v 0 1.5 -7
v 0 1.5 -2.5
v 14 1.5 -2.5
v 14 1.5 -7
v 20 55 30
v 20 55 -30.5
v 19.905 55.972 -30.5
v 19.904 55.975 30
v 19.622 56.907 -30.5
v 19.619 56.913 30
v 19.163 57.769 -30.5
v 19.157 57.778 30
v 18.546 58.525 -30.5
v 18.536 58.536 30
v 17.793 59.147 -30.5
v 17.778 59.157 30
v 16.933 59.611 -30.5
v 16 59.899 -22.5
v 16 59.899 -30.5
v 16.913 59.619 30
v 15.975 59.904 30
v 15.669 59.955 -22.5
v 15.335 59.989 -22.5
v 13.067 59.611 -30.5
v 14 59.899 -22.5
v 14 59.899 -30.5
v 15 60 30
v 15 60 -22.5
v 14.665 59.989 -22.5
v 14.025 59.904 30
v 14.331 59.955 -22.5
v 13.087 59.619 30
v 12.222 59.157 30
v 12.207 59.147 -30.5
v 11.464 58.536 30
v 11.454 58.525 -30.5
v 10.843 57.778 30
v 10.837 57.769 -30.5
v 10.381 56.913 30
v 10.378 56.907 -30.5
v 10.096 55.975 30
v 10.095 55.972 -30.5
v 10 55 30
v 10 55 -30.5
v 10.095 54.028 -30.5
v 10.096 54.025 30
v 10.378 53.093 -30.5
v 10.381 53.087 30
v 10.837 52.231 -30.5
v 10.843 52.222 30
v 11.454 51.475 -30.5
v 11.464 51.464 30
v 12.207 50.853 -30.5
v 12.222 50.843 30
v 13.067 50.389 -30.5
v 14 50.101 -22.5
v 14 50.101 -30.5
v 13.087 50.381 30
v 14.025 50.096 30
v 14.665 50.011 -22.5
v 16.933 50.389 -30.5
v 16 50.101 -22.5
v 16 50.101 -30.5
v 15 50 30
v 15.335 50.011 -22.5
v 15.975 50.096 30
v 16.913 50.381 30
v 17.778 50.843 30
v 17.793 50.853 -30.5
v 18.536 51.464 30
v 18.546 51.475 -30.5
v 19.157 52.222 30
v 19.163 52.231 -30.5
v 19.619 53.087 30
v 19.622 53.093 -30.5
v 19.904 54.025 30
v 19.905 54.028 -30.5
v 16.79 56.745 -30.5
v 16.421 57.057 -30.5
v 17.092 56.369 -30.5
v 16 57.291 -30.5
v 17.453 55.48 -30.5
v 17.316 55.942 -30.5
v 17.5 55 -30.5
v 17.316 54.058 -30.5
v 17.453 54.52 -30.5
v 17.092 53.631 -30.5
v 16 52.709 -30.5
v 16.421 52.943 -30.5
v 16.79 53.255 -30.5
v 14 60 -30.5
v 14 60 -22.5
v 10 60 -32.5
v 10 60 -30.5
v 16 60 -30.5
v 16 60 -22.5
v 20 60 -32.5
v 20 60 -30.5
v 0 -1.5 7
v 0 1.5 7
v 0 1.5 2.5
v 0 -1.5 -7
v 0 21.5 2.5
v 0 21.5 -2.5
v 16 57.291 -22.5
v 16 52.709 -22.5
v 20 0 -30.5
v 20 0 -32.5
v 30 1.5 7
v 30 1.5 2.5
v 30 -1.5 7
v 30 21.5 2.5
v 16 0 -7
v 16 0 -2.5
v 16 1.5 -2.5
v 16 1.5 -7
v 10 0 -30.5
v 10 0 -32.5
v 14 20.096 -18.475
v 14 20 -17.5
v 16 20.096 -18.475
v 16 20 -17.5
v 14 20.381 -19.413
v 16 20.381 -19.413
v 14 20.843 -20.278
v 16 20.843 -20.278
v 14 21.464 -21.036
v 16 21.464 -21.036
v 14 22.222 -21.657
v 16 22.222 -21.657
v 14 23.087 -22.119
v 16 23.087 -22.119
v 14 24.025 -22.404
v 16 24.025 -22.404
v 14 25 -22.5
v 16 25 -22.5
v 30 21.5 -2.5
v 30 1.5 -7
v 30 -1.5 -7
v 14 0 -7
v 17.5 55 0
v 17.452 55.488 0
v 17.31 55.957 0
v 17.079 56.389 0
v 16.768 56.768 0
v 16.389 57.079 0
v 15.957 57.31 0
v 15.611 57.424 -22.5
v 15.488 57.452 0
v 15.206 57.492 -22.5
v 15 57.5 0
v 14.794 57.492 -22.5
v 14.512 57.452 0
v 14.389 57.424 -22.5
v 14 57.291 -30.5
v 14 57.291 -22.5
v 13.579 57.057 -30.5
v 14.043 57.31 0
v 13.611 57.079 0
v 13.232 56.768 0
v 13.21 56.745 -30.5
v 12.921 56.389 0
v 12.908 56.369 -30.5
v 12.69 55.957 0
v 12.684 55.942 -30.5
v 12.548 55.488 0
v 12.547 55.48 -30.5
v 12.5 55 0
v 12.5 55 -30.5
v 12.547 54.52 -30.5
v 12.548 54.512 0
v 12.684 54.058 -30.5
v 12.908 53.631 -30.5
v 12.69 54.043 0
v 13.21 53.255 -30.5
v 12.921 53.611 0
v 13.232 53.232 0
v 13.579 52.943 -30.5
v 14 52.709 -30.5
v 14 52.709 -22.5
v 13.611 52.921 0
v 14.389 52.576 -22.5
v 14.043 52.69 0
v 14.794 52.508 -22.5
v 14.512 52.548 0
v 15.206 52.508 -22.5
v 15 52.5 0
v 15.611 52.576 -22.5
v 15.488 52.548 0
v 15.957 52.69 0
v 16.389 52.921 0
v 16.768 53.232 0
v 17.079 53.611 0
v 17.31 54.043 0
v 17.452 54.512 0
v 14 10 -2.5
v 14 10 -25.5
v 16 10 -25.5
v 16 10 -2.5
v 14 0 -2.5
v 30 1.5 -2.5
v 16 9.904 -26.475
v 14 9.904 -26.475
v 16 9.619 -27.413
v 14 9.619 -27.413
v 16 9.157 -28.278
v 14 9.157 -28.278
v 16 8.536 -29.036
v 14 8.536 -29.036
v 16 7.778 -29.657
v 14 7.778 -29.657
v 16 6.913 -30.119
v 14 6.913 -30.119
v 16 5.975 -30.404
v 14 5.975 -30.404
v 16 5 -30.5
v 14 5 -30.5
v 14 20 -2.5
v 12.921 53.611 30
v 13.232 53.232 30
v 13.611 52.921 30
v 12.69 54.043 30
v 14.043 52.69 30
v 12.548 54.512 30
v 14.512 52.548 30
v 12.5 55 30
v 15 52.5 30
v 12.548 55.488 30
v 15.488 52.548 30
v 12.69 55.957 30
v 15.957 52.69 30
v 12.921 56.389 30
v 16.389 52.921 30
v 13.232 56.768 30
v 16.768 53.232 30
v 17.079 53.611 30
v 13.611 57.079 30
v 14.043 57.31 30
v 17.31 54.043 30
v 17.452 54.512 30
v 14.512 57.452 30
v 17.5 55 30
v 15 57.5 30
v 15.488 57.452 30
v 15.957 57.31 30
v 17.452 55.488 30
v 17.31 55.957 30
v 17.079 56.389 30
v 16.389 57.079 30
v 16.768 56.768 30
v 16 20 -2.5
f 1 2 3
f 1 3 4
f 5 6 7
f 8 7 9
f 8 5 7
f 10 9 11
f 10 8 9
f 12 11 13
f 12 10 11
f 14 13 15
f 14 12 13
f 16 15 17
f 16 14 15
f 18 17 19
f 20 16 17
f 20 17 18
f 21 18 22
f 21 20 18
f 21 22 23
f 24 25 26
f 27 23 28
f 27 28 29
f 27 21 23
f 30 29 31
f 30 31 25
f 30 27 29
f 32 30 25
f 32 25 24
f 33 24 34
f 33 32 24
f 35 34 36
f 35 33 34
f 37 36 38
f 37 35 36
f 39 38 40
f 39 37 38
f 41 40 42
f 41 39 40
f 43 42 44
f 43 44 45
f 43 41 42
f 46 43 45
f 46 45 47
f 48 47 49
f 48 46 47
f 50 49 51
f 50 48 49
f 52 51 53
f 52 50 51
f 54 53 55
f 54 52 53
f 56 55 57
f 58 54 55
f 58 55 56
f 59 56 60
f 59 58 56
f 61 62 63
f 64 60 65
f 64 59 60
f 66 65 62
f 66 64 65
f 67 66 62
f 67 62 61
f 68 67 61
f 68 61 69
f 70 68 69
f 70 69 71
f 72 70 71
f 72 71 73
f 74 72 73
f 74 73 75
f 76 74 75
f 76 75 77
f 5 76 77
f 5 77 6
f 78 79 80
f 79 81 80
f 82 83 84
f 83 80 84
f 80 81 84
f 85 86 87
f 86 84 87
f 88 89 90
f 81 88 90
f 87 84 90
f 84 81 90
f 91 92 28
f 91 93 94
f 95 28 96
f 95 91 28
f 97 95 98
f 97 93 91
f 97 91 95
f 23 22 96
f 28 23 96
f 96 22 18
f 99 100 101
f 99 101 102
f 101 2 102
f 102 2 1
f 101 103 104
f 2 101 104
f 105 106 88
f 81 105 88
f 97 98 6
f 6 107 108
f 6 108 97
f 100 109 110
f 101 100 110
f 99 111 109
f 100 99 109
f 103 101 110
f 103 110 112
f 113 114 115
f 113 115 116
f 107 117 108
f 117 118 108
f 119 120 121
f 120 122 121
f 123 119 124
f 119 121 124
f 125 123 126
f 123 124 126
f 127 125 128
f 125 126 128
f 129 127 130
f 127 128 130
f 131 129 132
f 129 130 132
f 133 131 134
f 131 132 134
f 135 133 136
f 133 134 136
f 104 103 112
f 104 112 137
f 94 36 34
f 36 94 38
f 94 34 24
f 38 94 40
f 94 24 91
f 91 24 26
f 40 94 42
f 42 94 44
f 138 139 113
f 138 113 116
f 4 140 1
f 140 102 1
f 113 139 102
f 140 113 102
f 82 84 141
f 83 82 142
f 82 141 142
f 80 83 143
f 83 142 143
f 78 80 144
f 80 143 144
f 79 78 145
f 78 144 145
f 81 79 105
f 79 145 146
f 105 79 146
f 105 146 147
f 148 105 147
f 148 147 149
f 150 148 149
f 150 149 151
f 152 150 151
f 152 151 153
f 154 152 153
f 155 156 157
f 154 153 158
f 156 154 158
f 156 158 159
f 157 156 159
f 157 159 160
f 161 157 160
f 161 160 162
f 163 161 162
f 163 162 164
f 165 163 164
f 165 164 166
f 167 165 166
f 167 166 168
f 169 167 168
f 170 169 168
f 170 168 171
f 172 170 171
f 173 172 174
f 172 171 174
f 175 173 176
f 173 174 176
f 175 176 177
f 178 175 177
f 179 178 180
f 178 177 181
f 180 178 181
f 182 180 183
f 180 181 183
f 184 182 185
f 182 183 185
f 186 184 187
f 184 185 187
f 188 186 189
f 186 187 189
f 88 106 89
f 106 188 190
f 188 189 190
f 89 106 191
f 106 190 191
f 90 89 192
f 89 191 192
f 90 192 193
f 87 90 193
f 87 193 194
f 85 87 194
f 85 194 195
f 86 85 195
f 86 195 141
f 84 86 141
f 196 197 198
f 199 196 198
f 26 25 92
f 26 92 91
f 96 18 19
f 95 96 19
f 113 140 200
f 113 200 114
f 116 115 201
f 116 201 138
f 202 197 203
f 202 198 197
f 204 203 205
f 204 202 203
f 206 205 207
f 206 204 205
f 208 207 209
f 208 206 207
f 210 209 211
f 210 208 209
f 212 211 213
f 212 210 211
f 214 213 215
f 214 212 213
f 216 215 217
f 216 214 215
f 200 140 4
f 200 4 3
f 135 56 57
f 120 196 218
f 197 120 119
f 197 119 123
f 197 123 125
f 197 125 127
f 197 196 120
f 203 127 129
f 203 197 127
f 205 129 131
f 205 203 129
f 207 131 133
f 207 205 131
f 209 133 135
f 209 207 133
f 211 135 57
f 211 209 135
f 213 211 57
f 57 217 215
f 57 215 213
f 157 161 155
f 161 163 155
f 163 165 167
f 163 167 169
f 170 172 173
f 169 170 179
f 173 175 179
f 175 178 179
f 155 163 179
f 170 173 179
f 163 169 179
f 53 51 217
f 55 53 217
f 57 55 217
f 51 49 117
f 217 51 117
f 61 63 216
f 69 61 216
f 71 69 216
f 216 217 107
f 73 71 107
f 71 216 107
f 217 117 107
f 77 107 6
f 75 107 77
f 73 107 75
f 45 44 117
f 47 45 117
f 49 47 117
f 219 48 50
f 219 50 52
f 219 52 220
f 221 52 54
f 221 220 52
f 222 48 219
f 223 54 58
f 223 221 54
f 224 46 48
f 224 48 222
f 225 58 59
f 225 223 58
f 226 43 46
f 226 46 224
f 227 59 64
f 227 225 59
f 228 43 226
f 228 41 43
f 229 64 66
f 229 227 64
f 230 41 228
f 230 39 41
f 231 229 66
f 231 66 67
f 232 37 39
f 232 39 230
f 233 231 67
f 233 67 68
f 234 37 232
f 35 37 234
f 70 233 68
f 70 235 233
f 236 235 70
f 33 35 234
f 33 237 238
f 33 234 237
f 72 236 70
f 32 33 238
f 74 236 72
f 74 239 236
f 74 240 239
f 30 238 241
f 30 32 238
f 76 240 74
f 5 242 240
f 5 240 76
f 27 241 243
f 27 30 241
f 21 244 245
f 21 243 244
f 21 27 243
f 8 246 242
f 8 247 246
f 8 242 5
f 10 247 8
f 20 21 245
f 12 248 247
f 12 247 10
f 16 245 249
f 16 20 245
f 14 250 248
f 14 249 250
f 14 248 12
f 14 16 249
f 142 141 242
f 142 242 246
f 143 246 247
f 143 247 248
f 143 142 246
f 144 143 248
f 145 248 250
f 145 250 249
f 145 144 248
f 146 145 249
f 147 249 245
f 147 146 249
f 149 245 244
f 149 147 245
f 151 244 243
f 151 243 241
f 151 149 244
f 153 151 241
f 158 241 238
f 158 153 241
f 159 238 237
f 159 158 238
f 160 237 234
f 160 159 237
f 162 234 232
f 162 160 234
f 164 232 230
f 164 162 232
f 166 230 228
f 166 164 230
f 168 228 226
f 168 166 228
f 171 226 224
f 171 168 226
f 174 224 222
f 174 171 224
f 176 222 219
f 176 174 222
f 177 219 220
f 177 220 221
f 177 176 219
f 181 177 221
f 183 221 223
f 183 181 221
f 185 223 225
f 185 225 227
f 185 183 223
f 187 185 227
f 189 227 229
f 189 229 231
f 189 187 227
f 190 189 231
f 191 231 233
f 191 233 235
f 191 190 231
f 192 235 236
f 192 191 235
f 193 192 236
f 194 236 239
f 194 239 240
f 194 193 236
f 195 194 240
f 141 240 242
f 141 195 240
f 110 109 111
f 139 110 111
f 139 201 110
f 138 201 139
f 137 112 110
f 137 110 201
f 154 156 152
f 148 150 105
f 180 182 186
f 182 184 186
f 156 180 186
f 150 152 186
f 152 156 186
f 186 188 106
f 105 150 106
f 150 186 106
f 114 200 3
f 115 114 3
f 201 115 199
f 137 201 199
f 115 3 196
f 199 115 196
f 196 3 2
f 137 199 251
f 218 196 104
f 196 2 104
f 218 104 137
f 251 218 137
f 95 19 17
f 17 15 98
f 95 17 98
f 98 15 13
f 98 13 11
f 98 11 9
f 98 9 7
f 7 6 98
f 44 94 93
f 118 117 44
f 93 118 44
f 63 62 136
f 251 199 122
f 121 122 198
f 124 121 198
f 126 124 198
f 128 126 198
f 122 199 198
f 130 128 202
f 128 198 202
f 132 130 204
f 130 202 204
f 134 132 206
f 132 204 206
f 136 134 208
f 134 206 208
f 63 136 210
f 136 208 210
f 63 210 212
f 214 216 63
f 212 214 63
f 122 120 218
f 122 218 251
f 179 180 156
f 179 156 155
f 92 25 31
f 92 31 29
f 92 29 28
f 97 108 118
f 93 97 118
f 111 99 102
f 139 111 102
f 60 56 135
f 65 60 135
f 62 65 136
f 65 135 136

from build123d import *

# Parameters (mm, degrees)
SKETCH1_W                       = 5
SKETCH1_H                       = 20
SKETCH1_W_2                     = 14
SKETCH1_H_2                     = 3
BOSS_EXTRUDE1_DEPTH             = 30
SKETCH4_W                       = 4
SKETCH4_H                       = 2
SKETCH4_W_2                     = 2
SKETCH4_H_2                     = 8
BOSS_EXTRUDE2_DEPTH             = 60
SKETCH4_4_W                     = 2
SKETCH4_4_H                     = 20
BOSS_EXTRUDE3_DEPTH             = 20
SKETCH4_5_W                     = 2
SKETCH4_5_H                     = 8
SKETCH4_5_H_2                   = 20
CUT_EXTRUDE1_DEPTH              = 10
SKETCH2_R                       = 5
SKETCH2_R_2                     = 2.5
BOSS_EXTRUDE4_DEPTH             = 30
BOSS_EXTRUDE4_DIRECTION_2_REACH = 76.54
FILLET1_R                       = 5


with BuildPart() as part:
    # Sketch1 → Boss-Extrude1 (new body)
    with BuildSketch(Plane(origin=(0, 0, 0), x_dir=(0, 0, -1), z_dir=(1, 0, 0))):
        with Locations((0, 11.5)):
            Rectangle(SKETCH1_W, SKETCH1_H)
        Rectangle(SKETCH1_W_2, SKETCH1_H_2)
    extrude(amount=BOSS_EXTRUDE1_DEPTH)



with BuildPart() as body_2:
    # Sketch4 → Boss-Extrude2 (new body)
    with BuildSketch(Plane(origin=(0, 0, 0), x_dir=(1, 0, 0), z_dir=(0, 1, 0))):
        with Locations((18, 31.5)):
            Rectangle(SKETCH4_W, SKETCH4_H)
        with Locations((15, 31.5)):
            Rectangle(SKETCH4_W_2, SKETCH4_H)
        with Locations((12, 31.5)):
            Rectangle(SKETCH4_W, SKETCH4_H)
        with Locations((15, 26.5)):
            Rectangle(SKETCH4_W_2, SKETCH4_H_2)
    extrude(amount=BOSS_EXTRUDE2_DEPTH)


with BuildPart() as part_1:
    add(part.part)

    add(body_2.part)  # Boss-Extrude3 merges body 2
    # Sketch4<4> → Boss-Extrude3 (add)
    with BuildSketch(Plane(origin=(0, 0, 0), x_dir=(1, 0, 0), z_dir=(0, 1, 0))):
        with Locations((15, 12.5)):
            Rectangle(SKETCH4_4_W, SKETCH4_4_H)
    extrude(amount=BOSS_EXTRUDE3_DEPTH)

    # Sketch4<5> → Cut-Extrude1 (cut)
    with BuildSketch(Plane(origin=(0, 0, 0), x_dir=(1, 0, 0), z_dir=(0, 1, 0))):
        with Locations((15, 26.5)):
            Rectangle(SKETCH4_5_W, SKETCH4_5_H)
        with Locations((15, 12.5)):
            Rectangle(SKETCH4_5_W, SKETCH4_5_H_2)
    extrude(amount=CUT_EXTRUDE1_DEPTH, mode=Mode.SUBTRACT)

    # Sketch2 → Boss-Extrude4 (add)
    with BuildSketch(Plane.XY):
        with Locations((15, 55)):
            Circle(SKETCH2_R)
        with Locations((15, 55)):
            Circle(SKETCH2_R_2, mode=Mode.SUBTRACT)
    extrude(amount=BOSS_EXTRUDE4_DEPTH)

    # Boss-Extrude4 direction 2: up to this face of the body (flat: up to its plane)
    boss_extrude4_direction_2_end = Plane(part_1.part.faces().sort_by_distance((15, 30, -32.5))[0])
    # Sketch2 → Boss-Extrude4 direction 2 (add, up to the picked face)
    with BuildSketch(Plane.XY, mode=Mode.PRIVATE) as boss_extrude4_direction_2_sk1:
        with Locations((15, 55)):
            Circle(SKETCH2_R)
        with Locations((15, 55)):
            Circle(SKETCH2_R_2, mode=Mode.SUBTRACT)
    boss_extrude4_direction_2_tool1 = split(extrude(boss_extrude4_direction_2_sk1.sketch, amount=-BOSS_EXTRUDE4_DIRECTION_2_REACH, mode=Mode.PRIVATE), bisect_by=boss_extrude4_direction_2_end, keep=Keep.BOTH, mode=Mode.PRIVATE)
    add(boss_extrude4_direction_2_tool1.solids().sort_by(Axis((10.141421, 55, 0), (0, 0, -1)))[0])

    # Fillet1
    fillet1_edges = [part_1.edges().sort_by_distance(p)[0] for p in [
        (15, 20, -22.5),
        (15, 10, -30.5),
    ]]
    fillet(fillet1_edges, radius=FILLET1_R)


solid = part_1.part
